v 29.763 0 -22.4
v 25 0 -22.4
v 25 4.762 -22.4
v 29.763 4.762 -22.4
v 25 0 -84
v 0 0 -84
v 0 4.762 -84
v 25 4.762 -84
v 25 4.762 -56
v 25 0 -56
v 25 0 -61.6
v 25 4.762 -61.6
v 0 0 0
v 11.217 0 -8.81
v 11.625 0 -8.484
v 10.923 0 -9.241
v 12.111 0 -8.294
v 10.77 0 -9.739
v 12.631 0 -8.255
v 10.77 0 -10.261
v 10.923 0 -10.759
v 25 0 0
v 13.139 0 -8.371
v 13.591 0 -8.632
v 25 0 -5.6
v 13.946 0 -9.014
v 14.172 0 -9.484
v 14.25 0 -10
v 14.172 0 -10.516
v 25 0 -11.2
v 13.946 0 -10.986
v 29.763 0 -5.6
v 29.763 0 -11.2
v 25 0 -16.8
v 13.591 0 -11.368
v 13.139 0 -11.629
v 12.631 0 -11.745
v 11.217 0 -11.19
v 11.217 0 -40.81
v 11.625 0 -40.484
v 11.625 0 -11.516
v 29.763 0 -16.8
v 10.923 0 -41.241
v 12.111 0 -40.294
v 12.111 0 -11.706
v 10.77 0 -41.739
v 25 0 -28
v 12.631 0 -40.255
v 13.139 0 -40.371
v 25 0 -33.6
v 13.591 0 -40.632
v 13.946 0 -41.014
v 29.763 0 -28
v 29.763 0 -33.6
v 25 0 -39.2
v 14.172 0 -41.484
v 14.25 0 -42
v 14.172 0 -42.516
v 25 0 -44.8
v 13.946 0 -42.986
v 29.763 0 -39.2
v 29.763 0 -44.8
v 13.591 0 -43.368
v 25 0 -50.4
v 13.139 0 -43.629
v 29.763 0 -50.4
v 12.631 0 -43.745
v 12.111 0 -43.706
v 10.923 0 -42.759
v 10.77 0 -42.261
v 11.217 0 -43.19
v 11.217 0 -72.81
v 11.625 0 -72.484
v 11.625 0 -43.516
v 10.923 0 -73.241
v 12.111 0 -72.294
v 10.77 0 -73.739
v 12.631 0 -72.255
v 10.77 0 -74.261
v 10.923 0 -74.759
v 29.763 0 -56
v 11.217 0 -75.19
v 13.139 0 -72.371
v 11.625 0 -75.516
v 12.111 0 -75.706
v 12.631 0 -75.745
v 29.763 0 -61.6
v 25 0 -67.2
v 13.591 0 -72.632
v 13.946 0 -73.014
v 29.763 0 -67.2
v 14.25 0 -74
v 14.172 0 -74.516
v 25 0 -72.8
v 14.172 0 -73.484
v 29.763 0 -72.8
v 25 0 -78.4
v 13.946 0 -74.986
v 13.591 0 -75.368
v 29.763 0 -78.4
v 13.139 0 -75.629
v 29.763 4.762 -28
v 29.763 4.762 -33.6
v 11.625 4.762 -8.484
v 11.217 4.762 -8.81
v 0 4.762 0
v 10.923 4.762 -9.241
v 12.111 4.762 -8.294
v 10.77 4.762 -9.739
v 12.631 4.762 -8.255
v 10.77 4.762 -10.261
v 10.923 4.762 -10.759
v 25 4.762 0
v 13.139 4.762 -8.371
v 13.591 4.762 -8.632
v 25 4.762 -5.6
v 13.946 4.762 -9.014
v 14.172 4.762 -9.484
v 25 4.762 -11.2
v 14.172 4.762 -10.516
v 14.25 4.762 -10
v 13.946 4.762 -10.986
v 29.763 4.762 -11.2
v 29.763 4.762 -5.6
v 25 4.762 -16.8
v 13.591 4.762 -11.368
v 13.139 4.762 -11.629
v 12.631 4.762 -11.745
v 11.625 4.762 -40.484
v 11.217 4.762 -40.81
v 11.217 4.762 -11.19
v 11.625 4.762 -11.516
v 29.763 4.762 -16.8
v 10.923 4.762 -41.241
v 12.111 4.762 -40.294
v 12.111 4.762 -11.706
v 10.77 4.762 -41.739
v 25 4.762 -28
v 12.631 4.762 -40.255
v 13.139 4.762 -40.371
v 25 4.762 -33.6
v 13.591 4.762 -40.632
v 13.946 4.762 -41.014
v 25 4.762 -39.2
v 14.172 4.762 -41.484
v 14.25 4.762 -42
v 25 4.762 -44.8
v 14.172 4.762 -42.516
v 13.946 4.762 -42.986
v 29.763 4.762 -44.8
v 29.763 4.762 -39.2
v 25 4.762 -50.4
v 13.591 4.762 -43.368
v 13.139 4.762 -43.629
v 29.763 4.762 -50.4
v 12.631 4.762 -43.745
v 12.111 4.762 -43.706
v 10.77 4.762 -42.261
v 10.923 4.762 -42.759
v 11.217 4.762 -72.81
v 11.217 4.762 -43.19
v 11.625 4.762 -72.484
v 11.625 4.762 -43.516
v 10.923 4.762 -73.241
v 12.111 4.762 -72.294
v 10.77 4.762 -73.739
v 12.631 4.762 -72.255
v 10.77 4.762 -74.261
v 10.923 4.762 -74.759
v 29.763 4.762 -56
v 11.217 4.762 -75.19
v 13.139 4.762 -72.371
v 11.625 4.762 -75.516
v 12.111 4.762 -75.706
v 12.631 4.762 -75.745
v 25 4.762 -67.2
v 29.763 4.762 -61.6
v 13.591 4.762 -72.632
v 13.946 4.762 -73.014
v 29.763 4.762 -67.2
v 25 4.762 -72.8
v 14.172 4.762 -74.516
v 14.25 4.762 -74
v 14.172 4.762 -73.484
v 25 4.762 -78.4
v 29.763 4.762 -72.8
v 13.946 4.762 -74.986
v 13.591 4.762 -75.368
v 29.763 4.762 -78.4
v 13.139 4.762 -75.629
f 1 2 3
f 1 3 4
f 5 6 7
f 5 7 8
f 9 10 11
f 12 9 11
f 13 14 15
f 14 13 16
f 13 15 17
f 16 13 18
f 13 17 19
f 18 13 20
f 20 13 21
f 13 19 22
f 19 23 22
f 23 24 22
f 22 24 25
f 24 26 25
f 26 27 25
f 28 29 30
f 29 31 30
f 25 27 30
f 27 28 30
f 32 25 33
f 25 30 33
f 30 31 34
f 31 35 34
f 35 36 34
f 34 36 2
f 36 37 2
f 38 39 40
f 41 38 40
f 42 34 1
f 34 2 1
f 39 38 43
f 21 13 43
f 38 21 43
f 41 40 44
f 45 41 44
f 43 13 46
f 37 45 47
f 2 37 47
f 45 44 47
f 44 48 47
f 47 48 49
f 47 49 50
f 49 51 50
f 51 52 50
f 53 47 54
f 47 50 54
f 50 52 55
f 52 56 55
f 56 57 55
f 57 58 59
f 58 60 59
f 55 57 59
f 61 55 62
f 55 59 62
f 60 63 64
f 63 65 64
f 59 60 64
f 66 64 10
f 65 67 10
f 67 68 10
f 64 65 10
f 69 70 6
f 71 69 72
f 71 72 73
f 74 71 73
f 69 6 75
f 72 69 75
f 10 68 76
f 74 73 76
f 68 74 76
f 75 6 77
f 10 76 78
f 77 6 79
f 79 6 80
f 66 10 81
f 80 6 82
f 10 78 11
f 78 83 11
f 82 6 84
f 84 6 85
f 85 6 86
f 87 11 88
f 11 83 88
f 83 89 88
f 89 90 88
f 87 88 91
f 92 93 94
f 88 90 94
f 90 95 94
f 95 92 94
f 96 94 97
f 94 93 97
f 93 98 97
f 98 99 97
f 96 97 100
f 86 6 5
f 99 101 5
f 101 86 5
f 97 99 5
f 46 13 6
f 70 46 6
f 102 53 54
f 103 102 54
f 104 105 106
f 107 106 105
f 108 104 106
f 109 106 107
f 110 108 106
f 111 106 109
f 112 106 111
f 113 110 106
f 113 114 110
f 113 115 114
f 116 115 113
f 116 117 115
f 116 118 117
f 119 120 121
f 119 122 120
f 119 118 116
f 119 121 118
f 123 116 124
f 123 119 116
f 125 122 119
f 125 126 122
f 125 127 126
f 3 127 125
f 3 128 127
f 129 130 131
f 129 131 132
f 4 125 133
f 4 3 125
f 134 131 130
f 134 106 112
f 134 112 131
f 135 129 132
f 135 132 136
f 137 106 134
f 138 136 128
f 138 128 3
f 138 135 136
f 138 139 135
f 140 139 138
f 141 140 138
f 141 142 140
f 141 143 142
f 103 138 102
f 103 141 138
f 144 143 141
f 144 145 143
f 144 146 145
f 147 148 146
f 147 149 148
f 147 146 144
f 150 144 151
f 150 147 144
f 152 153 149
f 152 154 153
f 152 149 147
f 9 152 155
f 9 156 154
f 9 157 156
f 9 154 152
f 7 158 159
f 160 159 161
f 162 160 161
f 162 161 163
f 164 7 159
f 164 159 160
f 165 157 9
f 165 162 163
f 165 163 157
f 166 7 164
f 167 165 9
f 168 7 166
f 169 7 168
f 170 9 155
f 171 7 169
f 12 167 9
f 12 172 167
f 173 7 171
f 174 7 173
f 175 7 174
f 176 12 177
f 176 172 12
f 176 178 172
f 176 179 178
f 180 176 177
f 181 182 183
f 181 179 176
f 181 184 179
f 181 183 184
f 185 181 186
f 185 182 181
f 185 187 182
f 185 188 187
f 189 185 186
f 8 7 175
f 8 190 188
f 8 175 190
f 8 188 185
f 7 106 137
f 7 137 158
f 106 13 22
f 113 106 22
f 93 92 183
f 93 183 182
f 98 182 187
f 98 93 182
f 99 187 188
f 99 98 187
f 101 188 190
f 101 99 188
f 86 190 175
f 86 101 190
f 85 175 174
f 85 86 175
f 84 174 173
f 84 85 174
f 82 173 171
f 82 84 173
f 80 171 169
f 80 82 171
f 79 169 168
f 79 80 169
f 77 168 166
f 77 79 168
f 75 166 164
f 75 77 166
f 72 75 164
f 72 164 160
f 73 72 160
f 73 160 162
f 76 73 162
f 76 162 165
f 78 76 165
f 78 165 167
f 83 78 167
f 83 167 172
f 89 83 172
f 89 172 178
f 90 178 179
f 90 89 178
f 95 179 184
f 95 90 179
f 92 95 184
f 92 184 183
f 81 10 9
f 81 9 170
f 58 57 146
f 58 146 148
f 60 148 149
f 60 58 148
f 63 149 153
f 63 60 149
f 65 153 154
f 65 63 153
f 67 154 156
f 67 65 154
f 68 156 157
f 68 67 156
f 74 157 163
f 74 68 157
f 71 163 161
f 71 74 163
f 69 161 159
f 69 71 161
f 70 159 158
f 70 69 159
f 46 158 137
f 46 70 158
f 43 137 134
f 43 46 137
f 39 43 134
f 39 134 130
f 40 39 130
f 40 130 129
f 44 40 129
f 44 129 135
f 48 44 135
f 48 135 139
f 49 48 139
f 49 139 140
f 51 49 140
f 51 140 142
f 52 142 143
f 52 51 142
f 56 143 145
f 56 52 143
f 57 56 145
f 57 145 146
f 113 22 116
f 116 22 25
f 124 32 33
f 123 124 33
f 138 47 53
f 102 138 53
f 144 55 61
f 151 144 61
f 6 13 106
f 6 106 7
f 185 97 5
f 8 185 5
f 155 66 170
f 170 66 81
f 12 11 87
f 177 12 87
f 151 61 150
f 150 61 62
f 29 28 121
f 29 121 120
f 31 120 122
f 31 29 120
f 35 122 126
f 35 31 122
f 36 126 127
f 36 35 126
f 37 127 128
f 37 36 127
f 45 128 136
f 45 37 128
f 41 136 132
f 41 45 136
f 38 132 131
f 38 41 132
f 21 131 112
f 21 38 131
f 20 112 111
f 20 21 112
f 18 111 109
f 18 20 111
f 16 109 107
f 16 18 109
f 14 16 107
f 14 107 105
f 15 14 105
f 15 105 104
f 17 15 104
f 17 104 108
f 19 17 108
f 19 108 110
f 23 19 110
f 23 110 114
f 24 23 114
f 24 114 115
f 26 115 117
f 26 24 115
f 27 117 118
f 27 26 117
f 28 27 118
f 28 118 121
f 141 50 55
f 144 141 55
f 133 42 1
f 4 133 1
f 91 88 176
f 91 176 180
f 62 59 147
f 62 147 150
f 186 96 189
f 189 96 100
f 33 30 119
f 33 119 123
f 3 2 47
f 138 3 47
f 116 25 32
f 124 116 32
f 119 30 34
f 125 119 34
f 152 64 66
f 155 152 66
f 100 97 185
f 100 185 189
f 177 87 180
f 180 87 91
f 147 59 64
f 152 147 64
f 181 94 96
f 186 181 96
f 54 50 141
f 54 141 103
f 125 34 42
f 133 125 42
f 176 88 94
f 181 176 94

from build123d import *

# Parameters (mm, degrees)
SKETCH1_W           = 25
SKETCH1_H           = 84
SKETCH1_R           = 1.75
SKETCH1_W_2         = 4.7625
SKETCH1_H_2         = 5.6
BOSS_EXTRUDE1_DEPTH = 4.7625


with BuildPart() as part:
    # Sketch1 → Boss-Extrude1 (new body)
    with BuildSketch(Plane(origin=(0, 0, 0), x_dir=(1, 0, 0), z_dir=(0, 1, 0))):
        with Locations((12.5, 42)):
            Rectangle(SKETCH1_W, SKETCH1_H)
        with Locations((12.5, 10)):
            Circle(SKETCH1_R, mode=Mode.SUBTRACT)
        with Locations((12.5, 42)):
            Circle(SKETCH1_R, mode=Mode.SUBTRACT)
        with Locations((12.5, 74)):
            Circle(SKETCH1_R, mode=Mode.SUBTRACT)
        with Locations((27.38125, 30.8)):
            Rectangle(SKETCH1_W_2, SKETCH1_H_2)
        with Locations((27.38125, 19.6)):
            Rectangle(SKETCH1_W_2, SKETCH1_H_2)
        with Locations((27.38125, 42)):
            Rectangle(SKETCH1_W_2, SKETCH1_H_2)
        with Locations((27.38125, 53.2)):
            Rectangle(SKETCH1_W_2, SKETCH1_H_2)
        with Locations((27.38125, 64.4)):
            Rectangle(SKETCH1_W_2, SKETCH1_H_2)
        with Locations((27.38125, 75.6)):
            Rectangle(SKETCH1_W_2, SKETCH1_H_2)
        with Locations((27.38125, 8.4)):
            Rectangle(SKETCH1_W_2, SKETCH1_H_2)
    extrude(amount=BOSS_EXTRUDE1_DEPTH)


solid = part.part
